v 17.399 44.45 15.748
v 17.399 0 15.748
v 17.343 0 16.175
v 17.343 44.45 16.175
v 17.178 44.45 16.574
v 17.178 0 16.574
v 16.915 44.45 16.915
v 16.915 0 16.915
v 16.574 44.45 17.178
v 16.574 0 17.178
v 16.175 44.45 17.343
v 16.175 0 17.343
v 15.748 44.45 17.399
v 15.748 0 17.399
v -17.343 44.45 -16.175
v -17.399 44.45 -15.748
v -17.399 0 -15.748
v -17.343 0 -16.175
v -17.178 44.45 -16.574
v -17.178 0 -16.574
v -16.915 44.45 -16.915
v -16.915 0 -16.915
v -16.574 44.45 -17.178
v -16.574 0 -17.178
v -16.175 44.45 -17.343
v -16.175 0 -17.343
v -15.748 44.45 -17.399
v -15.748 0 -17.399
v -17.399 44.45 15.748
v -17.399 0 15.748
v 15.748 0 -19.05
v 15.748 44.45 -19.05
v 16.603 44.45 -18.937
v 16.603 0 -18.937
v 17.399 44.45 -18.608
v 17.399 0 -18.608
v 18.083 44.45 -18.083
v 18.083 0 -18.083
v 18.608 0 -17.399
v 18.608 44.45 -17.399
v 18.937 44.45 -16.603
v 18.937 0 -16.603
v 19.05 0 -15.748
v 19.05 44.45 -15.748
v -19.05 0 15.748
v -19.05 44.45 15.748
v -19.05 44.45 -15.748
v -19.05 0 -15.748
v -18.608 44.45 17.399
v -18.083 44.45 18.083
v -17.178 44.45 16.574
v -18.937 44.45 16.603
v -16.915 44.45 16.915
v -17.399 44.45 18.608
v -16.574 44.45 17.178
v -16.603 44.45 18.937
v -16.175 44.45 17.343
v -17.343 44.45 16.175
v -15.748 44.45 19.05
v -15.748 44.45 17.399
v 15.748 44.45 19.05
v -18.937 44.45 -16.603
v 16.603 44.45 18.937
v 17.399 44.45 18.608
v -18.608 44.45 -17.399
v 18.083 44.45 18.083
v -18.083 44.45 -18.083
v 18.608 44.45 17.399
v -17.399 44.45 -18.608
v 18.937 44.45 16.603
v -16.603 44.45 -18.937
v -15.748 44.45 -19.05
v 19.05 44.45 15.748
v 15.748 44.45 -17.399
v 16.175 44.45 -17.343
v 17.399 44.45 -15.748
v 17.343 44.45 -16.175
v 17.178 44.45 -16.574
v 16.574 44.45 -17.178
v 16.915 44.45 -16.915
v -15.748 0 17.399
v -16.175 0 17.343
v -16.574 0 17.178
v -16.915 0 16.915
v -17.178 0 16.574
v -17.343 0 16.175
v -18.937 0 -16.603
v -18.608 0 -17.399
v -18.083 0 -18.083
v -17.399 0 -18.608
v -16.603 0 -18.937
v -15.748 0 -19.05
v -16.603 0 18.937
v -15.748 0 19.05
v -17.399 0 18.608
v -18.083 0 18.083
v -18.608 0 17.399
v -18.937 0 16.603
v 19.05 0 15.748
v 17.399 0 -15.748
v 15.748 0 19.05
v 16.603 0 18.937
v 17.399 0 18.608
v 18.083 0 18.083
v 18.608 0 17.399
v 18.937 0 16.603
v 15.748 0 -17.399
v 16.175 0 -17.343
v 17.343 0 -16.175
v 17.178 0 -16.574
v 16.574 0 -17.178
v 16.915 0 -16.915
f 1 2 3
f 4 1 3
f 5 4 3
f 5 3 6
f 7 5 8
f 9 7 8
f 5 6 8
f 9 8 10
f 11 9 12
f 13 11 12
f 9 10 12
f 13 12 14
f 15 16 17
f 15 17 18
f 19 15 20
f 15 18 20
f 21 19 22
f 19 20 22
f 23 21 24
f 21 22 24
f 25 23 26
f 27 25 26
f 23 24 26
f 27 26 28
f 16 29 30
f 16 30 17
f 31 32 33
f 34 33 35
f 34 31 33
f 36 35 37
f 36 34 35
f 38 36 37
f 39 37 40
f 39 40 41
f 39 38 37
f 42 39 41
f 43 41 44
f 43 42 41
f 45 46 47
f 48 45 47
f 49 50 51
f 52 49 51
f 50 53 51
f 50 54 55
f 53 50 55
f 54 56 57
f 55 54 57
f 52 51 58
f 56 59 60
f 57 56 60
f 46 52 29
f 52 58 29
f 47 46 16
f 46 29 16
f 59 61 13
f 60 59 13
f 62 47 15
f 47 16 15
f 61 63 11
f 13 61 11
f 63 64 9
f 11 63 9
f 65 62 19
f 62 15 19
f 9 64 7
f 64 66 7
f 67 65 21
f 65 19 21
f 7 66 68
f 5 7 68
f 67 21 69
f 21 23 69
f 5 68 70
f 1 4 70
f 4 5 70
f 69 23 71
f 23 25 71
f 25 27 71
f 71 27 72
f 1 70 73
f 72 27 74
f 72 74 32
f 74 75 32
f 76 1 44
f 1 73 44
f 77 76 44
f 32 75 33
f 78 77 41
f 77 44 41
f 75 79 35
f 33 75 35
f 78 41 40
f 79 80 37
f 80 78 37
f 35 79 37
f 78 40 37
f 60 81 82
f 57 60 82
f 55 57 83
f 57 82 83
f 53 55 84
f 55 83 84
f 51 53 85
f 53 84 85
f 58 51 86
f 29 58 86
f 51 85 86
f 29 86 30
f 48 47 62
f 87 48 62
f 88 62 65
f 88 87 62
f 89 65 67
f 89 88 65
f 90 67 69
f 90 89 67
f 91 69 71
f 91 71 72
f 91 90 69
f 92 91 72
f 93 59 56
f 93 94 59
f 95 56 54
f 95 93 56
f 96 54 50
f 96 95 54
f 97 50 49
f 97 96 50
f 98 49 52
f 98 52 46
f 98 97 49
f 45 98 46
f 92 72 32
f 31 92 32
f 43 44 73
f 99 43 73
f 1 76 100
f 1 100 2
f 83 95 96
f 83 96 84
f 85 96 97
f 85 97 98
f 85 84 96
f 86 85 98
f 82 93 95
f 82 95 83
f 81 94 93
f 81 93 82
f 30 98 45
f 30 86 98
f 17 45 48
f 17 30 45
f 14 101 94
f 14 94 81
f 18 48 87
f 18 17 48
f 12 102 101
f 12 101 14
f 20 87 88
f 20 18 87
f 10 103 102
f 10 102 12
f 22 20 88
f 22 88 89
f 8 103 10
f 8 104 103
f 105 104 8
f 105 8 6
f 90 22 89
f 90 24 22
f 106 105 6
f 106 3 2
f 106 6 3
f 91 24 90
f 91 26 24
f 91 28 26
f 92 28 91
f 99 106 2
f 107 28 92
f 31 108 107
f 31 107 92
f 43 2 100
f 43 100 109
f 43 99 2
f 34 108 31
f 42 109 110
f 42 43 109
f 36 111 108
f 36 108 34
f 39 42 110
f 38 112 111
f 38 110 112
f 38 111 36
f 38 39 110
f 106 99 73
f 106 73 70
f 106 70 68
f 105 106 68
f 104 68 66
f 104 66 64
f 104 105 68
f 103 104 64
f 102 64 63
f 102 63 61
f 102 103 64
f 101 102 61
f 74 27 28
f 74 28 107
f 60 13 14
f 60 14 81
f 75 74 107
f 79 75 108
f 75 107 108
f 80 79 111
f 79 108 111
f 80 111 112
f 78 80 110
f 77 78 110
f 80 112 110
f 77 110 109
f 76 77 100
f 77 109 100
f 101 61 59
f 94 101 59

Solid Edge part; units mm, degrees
sketch "Sketch1" plane through (0, 0, 0) normal (0, -1, 0) x (1, 0, 0)
  line L0 (-17.399, 15.748) -> (-17.399, -15.748)
  arc A0 (-17.399, -15.748) -> (-15.748, -17.399) centre (-15.748, -15.748) ccw
  line L1 (-15.748, -17.399) -> (15.748, -17.399)
  arc A1 (15.748, -17.399) -> (17.399, -15.748) centre (15.748, -15.748) ccw
  line L2 (17.399, -15.748) -> (17.399, 15.748)
  arc A2 (17.399, 15.748) -> (15.748, 17.399) centre (15.748, 15.748) ccw
  line L3 (15.748, 17.399) -> (-15.748, 17.399)
  arc A3 (-15.748, 17.399) -> (-17.399, 15.748) centre (-15.748, 15.748) ccw
  arc A4 (-19.05, -15.748) -> (-15.748, -19.05) centre (-15.748, -15.748) ccw
  line L4 (-15.748, -19.05) -> (15.748, -19.05)
  arc A5 (15.748, -19.05) -> (19.05, -15.748) centre (15.748, -15.748) ccw
  line L5 (19.05, -15.748) -> (19.05, 15.748)
  arc A6 (19.05, 15.748) -> (15.748, 19.05) centre (15.748, 15.748) ccw
  line L6 (15.748, 19.05) -> (-15.748, 19.05)
  arc A7 (-15.748, 19.05) -> (-19.05, 15.748) centre (-15.748, 15.748) ccw
  line L7 (-19.05, 15.748) -> (-19.05, -15.748)
  dimension "D1" = 3.302
  dimension "D2" = 1.651
  dimension "D3" = 38.1
  dimension "D4" = 38.1
  dimension "D5" = 1.651
  dimension "D6" = 1.651
  dimension "D7" = 1.651
  dimension "D8" = 1.651
extrude "Protrusion1" add sketch "Sketch1" against normal blind 44.45
properties material "Steel"
